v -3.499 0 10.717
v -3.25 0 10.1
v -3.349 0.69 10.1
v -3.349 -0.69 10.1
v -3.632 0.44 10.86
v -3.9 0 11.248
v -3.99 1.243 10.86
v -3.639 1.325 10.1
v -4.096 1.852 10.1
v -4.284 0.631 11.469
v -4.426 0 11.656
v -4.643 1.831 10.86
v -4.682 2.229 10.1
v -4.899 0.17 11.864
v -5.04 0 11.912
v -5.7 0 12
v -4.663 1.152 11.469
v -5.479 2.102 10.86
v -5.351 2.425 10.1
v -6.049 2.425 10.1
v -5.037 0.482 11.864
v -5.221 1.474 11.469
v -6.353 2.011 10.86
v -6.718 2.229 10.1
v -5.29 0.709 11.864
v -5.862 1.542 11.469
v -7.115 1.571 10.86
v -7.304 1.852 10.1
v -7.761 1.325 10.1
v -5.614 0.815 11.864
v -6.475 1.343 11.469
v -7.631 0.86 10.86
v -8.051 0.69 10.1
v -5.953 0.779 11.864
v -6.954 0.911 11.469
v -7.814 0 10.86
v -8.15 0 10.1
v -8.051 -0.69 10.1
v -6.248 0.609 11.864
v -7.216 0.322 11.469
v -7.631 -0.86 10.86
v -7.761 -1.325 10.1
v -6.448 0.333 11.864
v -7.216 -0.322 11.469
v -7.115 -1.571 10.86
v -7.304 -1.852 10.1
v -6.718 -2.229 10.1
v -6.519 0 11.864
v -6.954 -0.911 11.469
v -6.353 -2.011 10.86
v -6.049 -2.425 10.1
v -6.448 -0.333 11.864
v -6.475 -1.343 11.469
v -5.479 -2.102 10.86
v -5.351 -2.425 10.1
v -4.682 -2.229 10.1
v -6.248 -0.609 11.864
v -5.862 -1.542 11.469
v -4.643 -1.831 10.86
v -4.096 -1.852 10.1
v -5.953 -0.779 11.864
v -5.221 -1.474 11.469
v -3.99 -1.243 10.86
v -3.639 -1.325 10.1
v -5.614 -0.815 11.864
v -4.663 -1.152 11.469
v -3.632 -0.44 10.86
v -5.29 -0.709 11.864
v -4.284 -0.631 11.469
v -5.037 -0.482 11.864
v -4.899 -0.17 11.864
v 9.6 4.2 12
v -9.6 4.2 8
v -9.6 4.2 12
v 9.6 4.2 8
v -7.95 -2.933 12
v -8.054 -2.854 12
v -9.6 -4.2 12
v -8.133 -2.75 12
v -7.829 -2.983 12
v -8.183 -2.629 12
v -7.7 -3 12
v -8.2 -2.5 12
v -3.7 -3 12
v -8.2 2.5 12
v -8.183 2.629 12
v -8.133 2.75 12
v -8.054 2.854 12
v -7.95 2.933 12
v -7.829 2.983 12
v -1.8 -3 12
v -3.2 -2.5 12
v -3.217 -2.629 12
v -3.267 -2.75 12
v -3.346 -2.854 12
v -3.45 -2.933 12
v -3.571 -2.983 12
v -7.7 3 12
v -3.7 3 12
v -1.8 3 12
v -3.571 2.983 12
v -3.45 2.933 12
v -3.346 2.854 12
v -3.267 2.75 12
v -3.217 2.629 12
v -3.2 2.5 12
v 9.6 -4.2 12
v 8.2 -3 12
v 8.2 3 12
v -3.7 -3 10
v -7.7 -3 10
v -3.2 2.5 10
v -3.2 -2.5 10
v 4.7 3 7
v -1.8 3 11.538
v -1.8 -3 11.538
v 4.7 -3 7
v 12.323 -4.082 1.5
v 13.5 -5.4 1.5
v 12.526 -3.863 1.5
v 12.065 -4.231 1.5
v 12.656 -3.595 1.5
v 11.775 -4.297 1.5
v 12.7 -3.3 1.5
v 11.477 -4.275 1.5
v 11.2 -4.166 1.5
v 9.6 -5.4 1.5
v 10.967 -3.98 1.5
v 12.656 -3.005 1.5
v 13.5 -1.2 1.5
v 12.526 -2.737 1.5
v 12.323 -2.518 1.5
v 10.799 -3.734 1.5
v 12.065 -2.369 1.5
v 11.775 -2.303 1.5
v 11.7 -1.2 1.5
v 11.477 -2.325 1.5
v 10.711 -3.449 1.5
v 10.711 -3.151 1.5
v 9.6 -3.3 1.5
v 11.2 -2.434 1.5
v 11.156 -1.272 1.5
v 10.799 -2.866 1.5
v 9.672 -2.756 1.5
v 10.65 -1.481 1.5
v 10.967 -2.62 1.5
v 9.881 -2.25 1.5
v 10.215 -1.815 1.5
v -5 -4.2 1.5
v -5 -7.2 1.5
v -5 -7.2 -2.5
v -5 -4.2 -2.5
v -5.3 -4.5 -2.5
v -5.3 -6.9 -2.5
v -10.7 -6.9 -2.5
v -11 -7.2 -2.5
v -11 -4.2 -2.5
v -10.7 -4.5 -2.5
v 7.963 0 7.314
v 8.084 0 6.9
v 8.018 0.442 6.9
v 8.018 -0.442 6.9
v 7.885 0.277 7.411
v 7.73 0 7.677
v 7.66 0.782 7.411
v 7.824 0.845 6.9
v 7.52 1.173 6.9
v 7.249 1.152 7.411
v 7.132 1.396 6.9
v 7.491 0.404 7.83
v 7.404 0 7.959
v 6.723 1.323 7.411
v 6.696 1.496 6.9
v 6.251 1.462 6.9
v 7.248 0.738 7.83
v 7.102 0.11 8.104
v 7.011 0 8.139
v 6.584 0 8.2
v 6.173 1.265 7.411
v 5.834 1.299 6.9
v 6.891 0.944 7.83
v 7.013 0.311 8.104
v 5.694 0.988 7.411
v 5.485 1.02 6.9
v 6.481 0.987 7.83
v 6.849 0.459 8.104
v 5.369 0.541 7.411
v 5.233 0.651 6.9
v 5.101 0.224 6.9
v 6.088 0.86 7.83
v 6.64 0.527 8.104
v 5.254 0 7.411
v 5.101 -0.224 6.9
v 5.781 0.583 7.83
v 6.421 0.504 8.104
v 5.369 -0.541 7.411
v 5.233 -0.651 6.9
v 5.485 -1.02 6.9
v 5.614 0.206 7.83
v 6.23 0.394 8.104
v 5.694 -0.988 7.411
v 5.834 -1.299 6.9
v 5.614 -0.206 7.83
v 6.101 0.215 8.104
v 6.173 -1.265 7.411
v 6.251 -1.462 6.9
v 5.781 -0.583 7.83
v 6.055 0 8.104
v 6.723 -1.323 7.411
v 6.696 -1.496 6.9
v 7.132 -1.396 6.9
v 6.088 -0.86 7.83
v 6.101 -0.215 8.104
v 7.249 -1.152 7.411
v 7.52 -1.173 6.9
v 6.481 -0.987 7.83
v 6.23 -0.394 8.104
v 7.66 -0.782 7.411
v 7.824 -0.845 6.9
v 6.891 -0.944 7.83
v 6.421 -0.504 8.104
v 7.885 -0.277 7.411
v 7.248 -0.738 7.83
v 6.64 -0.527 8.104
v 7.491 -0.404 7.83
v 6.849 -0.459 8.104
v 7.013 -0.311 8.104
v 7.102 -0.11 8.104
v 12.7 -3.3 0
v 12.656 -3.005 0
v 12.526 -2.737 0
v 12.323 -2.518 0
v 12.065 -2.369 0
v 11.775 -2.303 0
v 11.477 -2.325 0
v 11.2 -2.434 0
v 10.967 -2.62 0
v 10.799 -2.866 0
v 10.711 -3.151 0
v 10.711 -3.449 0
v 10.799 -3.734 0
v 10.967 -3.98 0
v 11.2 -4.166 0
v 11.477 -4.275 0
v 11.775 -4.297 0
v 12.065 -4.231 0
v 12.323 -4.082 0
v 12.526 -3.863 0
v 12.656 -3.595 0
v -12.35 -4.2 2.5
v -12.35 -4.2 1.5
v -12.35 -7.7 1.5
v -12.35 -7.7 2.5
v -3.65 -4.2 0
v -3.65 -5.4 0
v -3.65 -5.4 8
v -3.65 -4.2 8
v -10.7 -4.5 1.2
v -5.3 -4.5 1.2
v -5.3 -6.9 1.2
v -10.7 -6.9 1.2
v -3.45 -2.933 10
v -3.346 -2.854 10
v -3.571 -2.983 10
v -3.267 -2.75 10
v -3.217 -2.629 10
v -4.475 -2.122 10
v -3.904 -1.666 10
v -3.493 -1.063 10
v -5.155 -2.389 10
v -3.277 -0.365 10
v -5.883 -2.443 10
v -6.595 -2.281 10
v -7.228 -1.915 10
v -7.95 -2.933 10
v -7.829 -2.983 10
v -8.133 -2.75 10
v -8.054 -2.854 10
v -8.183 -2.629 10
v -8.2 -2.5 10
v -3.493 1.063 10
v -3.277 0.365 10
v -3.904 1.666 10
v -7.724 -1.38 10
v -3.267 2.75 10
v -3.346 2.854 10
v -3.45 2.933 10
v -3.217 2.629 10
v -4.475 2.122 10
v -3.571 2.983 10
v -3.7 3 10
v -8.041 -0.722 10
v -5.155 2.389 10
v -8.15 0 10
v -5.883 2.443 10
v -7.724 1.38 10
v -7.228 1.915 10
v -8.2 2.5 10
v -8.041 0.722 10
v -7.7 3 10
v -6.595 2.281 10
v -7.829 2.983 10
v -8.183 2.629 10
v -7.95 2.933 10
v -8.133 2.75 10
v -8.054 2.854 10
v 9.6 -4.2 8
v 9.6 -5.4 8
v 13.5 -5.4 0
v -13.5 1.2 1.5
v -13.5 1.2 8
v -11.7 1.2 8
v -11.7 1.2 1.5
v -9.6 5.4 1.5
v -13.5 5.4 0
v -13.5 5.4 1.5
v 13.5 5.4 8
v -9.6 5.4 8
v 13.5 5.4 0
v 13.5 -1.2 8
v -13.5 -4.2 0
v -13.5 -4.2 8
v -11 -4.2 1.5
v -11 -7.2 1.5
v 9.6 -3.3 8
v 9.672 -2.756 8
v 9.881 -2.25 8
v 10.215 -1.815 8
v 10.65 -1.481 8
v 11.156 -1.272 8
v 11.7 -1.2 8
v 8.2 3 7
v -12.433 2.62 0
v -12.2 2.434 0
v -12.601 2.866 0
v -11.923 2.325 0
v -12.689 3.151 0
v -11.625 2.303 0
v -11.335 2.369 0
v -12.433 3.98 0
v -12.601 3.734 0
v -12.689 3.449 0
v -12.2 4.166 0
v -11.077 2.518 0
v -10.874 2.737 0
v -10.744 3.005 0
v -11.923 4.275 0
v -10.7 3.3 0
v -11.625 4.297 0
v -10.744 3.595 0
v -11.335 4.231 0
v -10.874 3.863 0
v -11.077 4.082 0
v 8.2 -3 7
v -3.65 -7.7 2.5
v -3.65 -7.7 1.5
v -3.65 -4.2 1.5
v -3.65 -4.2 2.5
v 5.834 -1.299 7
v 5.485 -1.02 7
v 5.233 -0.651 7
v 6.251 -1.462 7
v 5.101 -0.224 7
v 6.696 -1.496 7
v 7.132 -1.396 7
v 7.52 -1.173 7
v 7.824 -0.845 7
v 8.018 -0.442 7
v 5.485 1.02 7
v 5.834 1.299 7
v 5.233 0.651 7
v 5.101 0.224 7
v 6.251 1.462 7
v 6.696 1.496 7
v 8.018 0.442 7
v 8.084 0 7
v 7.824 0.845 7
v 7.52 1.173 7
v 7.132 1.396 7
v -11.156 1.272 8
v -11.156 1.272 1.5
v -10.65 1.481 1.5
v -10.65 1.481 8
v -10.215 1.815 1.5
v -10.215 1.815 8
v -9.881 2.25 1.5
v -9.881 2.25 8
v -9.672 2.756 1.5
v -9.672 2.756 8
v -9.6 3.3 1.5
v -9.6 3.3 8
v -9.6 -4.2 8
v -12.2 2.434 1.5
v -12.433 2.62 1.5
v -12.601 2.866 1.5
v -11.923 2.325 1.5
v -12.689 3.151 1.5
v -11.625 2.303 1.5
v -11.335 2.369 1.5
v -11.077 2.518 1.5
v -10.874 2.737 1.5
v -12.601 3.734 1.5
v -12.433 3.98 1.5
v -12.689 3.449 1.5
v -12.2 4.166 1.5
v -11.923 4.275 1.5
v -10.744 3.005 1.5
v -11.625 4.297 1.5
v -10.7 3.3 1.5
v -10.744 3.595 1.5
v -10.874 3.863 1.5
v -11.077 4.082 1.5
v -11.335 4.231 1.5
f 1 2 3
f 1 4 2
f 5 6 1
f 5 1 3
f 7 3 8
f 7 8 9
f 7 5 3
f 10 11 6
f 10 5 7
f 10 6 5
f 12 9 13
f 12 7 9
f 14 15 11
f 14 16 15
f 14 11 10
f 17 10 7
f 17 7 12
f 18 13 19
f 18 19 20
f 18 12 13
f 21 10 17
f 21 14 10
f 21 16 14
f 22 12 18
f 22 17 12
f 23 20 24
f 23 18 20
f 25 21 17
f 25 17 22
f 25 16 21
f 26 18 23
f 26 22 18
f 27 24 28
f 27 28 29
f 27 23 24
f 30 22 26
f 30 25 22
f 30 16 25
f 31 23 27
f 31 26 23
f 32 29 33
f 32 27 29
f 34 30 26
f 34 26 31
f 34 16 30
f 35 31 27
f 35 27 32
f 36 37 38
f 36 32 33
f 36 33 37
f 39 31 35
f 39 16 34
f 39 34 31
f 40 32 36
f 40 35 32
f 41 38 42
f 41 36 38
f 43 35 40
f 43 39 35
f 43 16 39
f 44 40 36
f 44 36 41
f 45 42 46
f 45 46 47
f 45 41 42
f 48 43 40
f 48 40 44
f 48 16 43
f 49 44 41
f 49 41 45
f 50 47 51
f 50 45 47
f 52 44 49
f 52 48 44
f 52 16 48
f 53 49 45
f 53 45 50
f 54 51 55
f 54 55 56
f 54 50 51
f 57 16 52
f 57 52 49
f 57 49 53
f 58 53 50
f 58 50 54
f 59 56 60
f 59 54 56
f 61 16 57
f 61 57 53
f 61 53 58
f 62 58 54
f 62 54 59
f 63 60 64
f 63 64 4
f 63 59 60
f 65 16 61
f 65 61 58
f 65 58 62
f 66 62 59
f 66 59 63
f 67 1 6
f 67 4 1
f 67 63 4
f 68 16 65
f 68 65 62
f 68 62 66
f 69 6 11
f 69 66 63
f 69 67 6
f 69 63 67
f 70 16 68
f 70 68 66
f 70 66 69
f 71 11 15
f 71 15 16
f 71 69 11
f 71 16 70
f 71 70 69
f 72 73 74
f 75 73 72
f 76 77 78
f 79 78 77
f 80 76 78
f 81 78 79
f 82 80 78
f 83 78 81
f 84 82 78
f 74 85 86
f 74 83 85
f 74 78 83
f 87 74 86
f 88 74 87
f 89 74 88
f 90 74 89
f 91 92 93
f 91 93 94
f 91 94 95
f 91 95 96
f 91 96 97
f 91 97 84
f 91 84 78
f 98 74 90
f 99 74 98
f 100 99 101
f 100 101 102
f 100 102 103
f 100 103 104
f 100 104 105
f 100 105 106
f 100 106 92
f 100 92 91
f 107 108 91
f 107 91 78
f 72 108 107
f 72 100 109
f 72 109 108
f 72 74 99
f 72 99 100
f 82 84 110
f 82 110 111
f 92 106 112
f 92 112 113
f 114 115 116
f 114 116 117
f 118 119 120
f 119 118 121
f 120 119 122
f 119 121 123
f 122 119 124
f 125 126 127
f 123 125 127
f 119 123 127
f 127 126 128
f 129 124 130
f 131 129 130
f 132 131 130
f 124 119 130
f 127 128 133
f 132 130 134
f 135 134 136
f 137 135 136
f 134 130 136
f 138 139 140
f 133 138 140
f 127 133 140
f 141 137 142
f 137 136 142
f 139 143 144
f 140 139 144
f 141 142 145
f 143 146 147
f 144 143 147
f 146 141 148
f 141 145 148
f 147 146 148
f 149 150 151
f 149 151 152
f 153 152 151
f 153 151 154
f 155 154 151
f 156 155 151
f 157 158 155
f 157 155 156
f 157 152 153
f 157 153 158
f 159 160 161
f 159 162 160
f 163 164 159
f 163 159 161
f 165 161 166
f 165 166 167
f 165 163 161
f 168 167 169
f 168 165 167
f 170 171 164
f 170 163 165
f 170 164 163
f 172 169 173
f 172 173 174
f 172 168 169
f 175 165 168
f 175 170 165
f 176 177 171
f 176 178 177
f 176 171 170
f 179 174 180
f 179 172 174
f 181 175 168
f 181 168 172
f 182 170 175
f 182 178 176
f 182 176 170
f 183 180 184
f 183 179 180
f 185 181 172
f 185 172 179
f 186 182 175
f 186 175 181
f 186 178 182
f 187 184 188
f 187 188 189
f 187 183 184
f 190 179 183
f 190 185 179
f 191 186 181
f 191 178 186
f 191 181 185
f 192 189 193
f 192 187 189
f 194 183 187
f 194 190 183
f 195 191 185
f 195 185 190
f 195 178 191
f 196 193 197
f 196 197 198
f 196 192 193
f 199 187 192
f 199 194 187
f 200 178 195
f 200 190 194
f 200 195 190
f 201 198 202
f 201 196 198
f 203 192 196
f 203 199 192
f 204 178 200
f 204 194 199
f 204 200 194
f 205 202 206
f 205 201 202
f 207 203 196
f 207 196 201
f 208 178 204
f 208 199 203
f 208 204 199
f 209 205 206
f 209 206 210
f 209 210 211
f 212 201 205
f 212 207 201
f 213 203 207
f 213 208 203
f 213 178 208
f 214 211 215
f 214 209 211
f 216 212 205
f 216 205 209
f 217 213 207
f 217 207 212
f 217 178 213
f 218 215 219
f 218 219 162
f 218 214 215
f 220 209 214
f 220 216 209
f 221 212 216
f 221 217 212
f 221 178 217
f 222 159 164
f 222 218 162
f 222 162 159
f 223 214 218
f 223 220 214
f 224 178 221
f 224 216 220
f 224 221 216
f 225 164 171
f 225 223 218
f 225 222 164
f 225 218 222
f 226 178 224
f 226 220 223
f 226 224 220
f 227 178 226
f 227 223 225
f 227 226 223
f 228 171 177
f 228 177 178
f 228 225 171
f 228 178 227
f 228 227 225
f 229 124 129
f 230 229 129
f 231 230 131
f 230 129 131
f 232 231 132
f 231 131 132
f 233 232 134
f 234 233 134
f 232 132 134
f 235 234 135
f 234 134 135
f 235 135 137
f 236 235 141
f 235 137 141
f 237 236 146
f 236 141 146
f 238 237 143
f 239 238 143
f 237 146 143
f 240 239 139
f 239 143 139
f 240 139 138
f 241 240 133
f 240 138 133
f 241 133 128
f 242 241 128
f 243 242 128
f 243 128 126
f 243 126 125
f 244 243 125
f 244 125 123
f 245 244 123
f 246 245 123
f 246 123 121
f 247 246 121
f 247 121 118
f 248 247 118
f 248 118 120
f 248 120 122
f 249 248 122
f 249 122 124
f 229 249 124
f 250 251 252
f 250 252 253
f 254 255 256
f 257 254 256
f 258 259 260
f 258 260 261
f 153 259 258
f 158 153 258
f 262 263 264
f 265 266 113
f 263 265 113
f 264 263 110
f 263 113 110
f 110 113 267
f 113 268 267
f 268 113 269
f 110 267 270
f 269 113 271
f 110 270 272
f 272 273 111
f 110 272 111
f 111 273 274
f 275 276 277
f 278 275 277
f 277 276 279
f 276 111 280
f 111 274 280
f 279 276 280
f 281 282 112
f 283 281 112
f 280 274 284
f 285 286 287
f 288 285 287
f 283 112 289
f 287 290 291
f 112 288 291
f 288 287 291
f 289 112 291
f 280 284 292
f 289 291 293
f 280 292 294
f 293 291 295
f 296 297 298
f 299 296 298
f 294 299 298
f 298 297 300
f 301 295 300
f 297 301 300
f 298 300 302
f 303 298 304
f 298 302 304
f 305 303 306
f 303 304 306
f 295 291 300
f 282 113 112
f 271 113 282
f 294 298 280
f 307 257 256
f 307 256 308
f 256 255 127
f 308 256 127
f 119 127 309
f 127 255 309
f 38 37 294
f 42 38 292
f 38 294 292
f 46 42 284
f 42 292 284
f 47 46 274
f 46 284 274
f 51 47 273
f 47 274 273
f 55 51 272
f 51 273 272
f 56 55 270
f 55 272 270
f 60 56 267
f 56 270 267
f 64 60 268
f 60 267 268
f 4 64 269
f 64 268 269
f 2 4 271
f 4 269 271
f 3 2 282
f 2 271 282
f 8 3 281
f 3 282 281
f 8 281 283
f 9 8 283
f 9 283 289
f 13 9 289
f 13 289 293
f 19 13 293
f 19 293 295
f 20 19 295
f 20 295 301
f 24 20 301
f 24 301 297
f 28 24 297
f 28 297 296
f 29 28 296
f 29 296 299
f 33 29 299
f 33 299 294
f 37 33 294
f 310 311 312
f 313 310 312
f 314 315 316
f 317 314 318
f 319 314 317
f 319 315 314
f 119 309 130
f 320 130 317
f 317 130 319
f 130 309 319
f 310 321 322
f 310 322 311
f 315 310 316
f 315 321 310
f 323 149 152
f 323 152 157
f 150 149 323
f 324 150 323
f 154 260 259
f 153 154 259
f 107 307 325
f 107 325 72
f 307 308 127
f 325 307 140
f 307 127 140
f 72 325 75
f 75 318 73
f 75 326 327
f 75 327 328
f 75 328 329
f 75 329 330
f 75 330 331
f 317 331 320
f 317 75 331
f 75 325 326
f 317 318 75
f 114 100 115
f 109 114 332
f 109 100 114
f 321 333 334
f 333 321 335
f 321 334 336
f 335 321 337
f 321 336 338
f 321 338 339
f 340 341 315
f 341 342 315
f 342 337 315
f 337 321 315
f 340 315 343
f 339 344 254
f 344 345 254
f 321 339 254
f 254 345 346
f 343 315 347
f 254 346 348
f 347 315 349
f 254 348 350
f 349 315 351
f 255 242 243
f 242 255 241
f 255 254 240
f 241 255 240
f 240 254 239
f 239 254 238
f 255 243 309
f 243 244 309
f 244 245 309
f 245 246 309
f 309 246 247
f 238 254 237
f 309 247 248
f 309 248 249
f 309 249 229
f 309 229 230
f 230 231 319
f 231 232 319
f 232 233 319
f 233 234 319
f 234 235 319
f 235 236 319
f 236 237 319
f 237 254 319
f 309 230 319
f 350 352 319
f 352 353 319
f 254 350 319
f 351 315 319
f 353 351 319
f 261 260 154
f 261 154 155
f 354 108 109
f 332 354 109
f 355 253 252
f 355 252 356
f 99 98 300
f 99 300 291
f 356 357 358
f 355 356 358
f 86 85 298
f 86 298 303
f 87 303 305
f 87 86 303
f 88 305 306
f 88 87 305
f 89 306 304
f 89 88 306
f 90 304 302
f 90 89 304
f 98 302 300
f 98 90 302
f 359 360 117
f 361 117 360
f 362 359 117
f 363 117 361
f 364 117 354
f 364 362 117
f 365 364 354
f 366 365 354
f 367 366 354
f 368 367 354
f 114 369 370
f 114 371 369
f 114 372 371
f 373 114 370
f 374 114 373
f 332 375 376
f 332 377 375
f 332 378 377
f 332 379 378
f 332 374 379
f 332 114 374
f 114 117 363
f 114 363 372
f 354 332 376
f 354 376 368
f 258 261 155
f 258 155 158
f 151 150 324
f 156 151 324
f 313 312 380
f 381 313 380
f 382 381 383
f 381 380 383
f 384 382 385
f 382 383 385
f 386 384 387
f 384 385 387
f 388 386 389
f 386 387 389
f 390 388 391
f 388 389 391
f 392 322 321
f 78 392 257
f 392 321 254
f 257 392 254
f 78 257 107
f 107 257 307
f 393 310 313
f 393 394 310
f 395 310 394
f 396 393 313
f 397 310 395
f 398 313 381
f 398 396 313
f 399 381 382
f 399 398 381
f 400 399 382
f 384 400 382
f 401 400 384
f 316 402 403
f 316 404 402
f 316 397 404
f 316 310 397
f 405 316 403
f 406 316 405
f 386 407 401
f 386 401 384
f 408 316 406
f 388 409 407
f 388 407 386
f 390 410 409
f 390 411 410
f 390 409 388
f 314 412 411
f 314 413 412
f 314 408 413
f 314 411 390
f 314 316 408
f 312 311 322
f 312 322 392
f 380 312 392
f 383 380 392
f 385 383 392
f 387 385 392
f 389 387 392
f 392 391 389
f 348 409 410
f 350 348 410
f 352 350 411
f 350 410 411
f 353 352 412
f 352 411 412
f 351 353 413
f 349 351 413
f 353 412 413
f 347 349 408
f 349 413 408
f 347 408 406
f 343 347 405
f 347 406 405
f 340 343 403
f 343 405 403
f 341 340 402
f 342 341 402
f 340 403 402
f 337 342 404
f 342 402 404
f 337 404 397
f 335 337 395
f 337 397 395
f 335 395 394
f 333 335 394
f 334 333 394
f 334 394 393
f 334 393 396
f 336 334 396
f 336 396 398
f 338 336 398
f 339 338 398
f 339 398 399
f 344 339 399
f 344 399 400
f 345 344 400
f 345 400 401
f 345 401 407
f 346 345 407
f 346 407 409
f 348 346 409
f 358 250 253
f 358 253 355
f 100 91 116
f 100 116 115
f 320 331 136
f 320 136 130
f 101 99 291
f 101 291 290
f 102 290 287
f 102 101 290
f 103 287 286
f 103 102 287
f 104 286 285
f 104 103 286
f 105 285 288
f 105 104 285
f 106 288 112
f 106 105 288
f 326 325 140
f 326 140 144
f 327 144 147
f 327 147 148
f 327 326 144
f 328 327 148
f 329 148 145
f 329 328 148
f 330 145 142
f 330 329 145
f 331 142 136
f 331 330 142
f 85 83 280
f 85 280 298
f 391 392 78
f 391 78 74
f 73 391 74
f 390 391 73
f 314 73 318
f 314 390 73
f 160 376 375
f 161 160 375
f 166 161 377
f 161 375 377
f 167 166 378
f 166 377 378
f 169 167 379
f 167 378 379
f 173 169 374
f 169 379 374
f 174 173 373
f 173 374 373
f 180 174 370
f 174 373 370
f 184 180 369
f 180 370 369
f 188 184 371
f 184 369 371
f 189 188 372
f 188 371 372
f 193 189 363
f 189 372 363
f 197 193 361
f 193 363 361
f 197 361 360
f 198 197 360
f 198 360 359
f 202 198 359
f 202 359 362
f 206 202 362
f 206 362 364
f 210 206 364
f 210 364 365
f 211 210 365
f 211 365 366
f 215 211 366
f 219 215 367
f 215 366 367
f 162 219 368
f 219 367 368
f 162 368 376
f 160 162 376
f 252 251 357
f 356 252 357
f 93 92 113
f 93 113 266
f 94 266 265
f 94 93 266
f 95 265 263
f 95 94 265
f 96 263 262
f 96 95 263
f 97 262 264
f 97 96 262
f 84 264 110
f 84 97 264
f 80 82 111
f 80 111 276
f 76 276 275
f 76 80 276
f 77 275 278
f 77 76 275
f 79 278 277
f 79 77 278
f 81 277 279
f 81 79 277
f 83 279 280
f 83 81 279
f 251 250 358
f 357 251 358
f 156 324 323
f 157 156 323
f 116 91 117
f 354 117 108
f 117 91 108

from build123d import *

# Parameters (mm, degrees)
SKETCH1_W           = 27
SKETCH1_H           = 10.8
BOSS_EXTRUDE1_DEPTH = 8
SKETCH2_R           = 1
CUT_EXTRUDE3_DEPTH  = 17.595481313
SKETCH2_3_R         = 1
CUT_EXTRUDE4_DEPTH  = 6.5
SKETCH6_W           = 9.85
SKETCH6_H           = 8
CUT_EXTRUDE5_DEPTH  = 1.2
SKETCH7_W           = 19.2
SKETCH7_H           = 8.4
BOSS_EXTRUDE2_DEPTH = 4
CUT_EXTRUDE6_DEPTH  = 2
SKETCH10_R          = 2.45
BOSS_EXTRUDE5_DEPTH = 0.1
DOME1_FACE_RADIUS   = 2.45
DOME1_HEIGHT        = 1.9
SKETCH11_W          = 10
SKETCH11_H          = 6
CUT_EXTRUDE7_DEPTH  = 5
SKETCH12_R          = 1.5
CUT_EXTRUDE8_DEPTH  = 0.1
BOSS_EXTRUDE6_REACH = 21.92
DOME2_FACE_RADIUS   = 1.5
DOME2_HEIGHT        = 1.3
SKETCH14_W          = 8.7
SKETCH14_H          = 1
BOSS_EXTRUDE7_DEPTH = 3.5
SKETCH15_W          = 6
SKETCH15_H          = 3
BOSS_EXTRUDE9_DEPTH = 4
SHELL1_T            = -0.3


with BuildPart() as part:
    # Sketch1 → Boss-Extrude1 (new body)
    with BuildSketch(Plane.XY):
        Rectangle(SKETCH1_W, SKETCH1_H)
    extrude(amount=BOSS_EXTRUDE1_DEPTH)

    # Sketch2 → Cut-Extrude3 (cut, through all)
    with BuildSketch(Plane.XY.offset(8)):
        with Locations((-11.7, 3.3)):
            Circle(SKETCH2_R)
        with Locations((11.7, -3.3)):
            Circle(SKETCH2_R)
    extrude(amount=-CUT_EXTRUDE3_DEPTH, mode=Mode.SUBTRACT)

    # Sketch2<3> → Cut-Extrude4 (cut)
    # profile 1 of 2: a face of its own
    with BuildSketch(Plane.XY.offset(8)):
        with BuildLine():
            Line((11.7, -1.2), (13.5, -1.2))
            Line((13.5, -1.2), (13.5, -5.4))
            Line((13.5, -5.4), (9.6, -5.4))
            Line((9.6, -5.4), (9.6, -3.3))
            ThreePointArc((9.6, -3.3), (10.21507576, -1.81507576), (11.7, -1.2))
        make_face()
        with Locations((11.7, -3.3)):
            Circle(SKETCH2_3_R, mode=Mode.SUBTRACT)
    # profile 2 of 2: a face of its own
    with BuildSketch(Plane.XY.offset(8)):
        with BuildLine():
            Line((-9.6, 3.3), (-9.6, 5.4))
            Line((-9.6, 5.4), (-13.5, 5.4))
            Line((-13.5, 5.4), (-13.5, 1.2))
            Line((-13.5, 1.2), (-11.7, 1.2))
            ThreePointArc((-11.7, 1.2), (-10.21507576, 1.81507576), (-9.6, 3.3))
        make_face()
        with Locations((-11.7, 3.3)):
            Circle(SKETCH2_3_R, mode=Mode.SUBTRACT)
    extrude(amount=-CUT_EXTRUDE4_DEPTH, mode=Mode.SUBTRACT)

    # Sketch6 → Cut-Extrude5 (cut)
    with BuildSketch(Plane.XZ.offset(5.4)):
        with Locations((-8.575, 4)):
            Rectangle(SKETCH6_W, SKETCH6_H)
    extrude(amount=-CUT_EXTRUDE5_DEPTH, mode=Mode.SUBTRACT)

    # Sketch7 → Boss-Extrude2 (add)
    with BuildSketch(Plane.XY.offset(8)):
        Rectangle(SKETCH7_W, SKETCH7_H)
    extrude(amount=BOSS_EXTRUDE2_DEPTH)

    # Sketch9 → Cut-Extrude6 (cut)
    with BuildSketch(Plane.XY.offset(12)):
        with BuildLine():
            Line((-7.7, 3), (-3.7, 3))
            ThreePointArc((-3.7, 3), (-3.346446609, 2.853553391), (-3.2, 2.5))
            Line((-3.2, 2.5), (-3.2, -2.5))
            ThreePointArc((-3.2, -2.5), (-3.346446609, -2.853553391), (-3.7, -3))
            Line((-3.7, -3), (-7.7, -3))
            ThreePointArc((-7.7, -3), (-8.053553391, -2.853553391), (-8.2, -2.5))
            Line((-8.2, -2.5), (-8.2, 2.5))
            ThreePointArc((-8.2, 2.5), (-8.053553391, 2.853553391), (-7.7, 3))
        make_face()
    extrude(amount=-CUT_EXTRUDE6_DEPTH, mode=Mode.SUBTRACT)

    # Sketch10 → Boss-Extrude5 (add)
    with BuildSketch(Plane.XY.offset(10)):
        with Locations(Location((-5.7, 0, 0), (0, 0, 180))):
            Circle(SKETCH10_R)
    extrude(amount=BOSS_EXTRUDE5_DEPTH)

    # Dome1: a dome of height H over a round flat face of radius A is a cap of a sphere of radius (A * A + H * H) / (2 * H)
    dome1_r = (DOME1_FACE_RADIUS * DOME1_FACE_RADIUS + DOME1_HEIGHT * DOME1_HEIGHT) / (2 * DOME1_HEIGHT)
    dome1_base = Plane((-5.7, 0, 10.1), z_dir=(0, 0, 1))
    with Locations(dome1_base.offset(DOME1_HEIGHT - dome1_r)):
        dome1_ball = Sphere(dome1_r, mode=Mode.PRIVATE)
    add(split(dome1_ball, bisect_by=dome1_base, keep=Keep.TOP, mode=Mode.PRIVATE))

    # Sketch11 → Cut-Extrude7 (cut)
    with BuildSketch(Plane.XY.offset(12)):
        with Locations((3.2, 0)):
            Rectangle(SKETCH11_W, SKETCH11_H)
    extrude(amount=-CUT_EXTRUDE7_DEPTH, mode=Mode.SUBTRACT)

    # Sketch12 → Cut-Extrude8 (cut)
    with BuildSketch(Plane.XY.offset(7)):
        with Locations((6.584374757, 0)):
            Circle(SKETCH12_R)
    extrude(amount=-CUT_EXTRUDE8_DEPTH, mode=Mode.SUBTRACT)

    # Sketch13 → Boss-Extrude6 (add, up to next)
    with BuildSketch(Plane.XZ.offset(-3), mode=Mode.PRIVATE) as boss_extrude6_sk1:
        Polygon((-1.8, 11.537973276), (4.7, 7), (-1.8, 7), align=None)
    boss_extrude6_tool1 = extrude(boss_extrude6_sk1.sketch, amount=BOSS_EXTRUDE6_REACH, mode=Mode.PRIVATE) - part.part
    add(boss_extrude6_tool1.solids().sort_by_distance((0.366667, 3, 8.512658))[0])

    # Dome2: a dome of height H over a round flat face of radius A is a cap of a sphere of radius (A * A + H * H) / (2 * H)
    dome2_r = (DOME2_FACE_RADIUS * DOME2_FACE_RADIUS + DOME2_HEIGHT * DOME2_HEIGHT) / (2 * DOME2_HEIGHT)
    dome2_base = Plane((6.584374757, 0, 6.9), z_dir=(0, 0, 1))
    with Locations(dome2_base.offset(DOME2_HEIGHT - dome2_r)):
        dome2_ball = Sphere(dome2_r, mode=Mode.PRIVATE)
    add(split(dome2_ball, bisect_by=dome2_base, keep=Keep.TOP, mode=Mode.PRIVATE))


with BuildPart() as body_2:
    # Sketch14 → Boss-Extrude7 (new body)
    with BuildSketch(Plane.XZ.offset(4.2)):
        with Locations((-8, 2)):
            Rectangle(SKETCH14_W, SKETCH14_H)
    extrude(amount=BOSS_EXTRUDE7_DEPTH)


with BuildPart() as body_3:
    # Sketch15 → Boss-Extrude9 (new body)
    with BuildSketch(Plane(origin=(0, 0, 1.5), x_dir=(-1, 0, 0), z_dir=(0, 0, -1))):
        with Locations((8, -5.7)):
            Rectangle(SKETCH15_W, SKETCH15_H)
    extrude(amount=BOSS_EXTRUDE9_DEPTH)

    # Shell1
    shell1_openings = [body_3.faces().sort_by_distance(p)[0] for p in [
        (-8, -5.7, -2.5),
    ]]
    offset(amount=SHELL1_T, openings=shell1_openings, kind=Kind.INTERSECTION)


solid = Compound([part.part, body_2.part, body_3.part])
